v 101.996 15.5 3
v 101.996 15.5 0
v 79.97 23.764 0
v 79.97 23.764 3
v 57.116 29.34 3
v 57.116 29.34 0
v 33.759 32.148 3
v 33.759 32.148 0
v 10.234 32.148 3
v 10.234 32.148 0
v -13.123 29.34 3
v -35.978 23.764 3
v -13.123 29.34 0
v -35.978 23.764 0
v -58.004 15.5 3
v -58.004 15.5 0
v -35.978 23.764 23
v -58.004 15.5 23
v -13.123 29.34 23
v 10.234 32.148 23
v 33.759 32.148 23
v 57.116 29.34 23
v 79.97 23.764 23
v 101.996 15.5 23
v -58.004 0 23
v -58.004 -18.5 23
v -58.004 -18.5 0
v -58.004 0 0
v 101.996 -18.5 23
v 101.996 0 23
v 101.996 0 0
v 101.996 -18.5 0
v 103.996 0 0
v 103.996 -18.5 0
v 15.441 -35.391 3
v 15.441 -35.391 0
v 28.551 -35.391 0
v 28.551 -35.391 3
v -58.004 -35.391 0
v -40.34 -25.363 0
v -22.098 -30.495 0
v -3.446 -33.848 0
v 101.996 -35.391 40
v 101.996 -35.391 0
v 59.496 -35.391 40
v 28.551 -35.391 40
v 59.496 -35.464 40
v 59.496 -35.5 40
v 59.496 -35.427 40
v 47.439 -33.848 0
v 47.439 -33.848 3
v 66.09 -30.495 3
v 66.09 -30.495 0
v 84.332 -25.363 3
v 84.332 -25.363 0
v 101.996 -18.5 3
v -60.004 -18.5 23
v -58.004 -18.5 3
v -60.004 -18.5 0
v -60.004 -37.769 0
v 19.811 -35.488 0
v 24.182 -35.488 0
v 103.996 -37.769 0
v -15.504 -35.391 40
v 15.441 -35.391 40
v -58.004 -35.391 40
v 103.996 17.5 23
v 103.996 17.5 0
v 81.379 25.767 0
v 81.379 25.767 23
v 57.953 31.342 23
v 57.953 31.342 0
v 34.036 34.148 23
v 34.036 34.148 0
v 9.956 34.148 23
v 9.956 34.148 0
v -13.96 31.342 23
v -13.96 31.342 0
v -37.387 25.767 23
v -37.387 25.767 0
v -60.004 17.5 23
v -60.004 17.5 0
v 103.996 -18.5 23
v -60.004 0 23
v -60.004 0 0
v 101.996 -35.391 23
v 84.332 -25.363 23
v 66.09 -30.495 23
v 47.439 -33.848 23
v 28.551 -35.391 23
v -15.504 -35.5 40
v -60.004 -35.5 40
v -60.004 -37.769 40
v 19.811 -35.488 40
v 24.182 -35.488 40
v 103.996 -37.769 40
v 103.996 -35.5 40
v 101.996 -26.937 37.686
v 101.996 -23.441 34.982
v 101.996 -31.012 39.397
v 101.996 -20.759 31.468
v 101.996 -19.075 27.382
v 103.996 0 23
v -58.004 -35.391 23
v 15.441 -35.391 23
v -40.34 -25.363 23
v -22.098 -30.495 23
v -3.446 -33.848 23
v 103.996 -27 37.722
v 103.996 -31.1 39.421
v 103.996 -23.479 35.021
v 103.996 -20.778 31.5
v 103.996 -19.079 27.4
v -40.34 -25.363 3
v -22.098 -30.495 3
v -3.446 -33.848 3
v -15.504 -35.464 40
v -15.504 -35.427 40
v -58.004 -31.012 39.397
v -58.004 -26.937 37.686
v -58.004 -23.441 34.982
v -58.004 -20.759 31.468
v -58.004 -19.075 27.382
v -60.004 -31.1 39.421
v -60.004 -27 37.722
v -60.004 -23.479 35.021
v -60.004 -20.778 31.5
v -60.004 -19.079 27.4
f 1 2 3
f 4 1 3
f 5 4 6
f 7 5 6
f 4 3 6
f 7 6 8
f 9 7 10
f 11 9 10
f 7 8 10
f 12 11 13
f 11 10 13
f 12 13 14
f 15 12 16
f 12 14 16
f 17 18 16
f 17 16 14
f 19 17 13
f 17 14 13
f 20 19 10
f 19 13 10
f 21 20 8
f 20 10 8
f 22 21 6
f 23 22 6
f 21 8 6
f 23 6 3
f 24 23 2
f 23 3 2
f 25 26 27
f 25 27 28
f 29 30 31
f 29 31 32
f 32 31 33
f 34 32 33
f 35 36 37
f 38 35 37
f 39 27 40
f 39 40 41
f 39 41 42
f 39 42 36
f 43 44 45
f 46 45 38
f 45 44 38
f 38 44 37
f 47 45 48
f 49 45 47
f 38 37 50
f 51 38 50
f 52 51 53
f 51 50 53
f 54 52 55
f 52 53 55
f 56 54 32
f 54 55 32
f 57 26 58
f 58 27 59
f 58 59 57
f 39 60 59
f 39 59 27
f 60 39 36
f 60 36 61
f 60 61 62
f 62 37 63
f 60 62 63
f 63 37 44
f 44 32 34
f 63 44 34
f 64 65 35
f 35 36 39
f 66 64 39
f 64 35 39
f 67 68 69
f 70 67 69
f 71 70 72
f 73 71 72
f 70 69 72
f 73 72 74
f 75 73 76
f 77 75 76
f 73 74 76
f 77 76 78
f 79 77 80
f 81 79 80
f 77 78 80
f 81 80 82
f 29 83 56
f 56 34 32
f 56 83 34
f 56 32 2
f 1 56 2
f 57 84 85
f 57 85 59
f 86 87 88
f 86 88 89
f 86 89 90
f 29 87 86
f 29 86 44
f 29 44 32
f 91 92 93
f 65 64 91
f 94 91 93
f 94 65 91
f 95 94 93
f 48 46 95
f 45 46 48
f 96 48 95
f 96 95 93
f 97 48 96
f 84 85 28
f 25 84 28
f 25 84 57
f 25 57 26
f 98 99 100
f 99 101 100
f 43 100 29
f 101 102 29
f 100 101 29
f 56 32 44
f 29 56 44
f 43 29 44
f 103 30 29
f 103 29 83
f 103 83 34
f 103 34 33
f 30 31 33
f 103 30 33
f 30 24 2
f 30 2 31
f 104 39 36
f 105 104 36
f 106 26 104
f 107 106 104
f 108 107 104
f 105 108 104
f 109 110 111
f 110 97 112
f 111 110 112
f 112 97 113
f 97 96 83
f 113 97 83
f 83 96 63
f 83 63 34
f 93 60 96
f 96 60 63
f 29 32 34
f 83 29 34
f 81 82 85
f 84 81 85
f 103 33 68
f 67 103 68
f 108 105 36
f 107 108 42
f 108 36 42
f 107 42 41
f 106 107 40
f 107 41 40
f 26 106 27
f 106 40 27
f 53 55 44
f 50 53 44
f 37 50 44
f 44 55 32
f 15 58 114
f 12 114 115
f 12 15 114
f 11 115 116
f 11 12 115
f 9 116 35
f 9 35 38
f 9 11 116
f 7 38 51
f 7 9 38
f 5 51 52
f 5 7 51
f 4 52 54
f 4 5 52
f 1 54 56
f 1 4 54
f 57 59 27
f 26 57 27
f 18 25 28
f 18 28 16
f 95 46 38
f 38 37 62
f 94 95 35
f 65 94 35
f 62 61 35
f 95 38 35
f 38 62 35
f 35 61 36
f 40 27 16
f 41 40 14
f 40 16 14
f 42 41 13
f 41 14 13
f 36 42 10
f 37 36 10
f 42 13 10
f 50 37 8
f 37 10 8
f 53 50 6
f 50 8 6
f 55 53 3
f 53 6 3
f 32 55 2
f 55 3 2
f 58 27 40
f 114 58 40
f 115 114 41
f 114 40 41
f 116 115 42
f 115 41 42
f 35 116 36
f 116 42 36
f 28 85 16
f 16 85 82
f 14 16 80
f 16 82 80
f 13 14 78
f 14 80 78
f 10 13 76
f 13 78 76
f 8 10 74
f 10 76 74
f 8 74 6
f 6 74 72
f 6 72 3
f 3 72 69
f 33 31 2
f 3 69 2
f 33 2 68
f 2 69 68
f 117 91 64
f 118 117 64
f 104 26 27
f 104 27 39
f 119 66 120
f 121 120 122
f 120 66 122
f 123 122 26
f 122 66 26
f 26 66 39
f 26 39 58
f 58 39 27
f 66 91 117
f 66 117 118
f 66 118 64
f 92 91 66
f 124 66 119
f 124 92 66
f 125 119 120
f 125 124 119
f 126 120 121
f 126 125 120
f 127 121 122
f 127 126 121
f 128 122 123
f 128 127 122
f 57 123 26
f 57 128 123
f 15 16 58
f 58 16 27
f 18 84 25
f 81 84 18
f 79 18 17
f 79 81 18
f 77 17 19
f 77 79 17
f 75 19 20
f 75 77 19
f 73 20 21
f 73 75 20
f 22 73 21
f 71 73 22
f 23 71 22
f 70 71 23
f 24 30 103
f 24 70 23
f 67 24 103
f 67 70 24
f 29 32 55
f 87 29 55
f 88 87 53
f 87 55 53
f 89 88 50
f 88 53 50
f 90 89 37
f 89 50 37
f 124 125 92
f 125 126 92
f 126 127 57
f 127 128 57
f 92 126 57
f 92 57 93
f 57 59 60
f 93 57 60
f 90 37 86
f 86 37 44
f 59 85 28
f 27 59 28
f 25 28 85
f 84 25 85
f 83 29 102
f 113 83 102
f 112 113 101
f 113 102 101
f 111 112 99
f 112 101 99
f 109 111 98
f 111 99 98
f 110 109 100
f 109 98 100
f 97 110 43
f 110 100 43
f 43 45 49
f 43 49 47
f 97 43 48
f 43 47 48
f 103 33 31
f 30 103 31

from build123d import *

# Parameters (mm, degrees)
F1_DEPTH    = 3
F2_DEPTH    = 40
F3_DEPTH    = 23
F4_DEPTH    = 23
F5_T1_DEPTH = 87
F6_T1_DEPTH = 87
F7_DEPTH    = 23
F8_DEPTH    = 23


# Not quite as in the source:
# - a fillet or chamfer that OpenCascade refuses, or shapes differently, is made with other operations: its cross-section is extruded or revolved along the edge and cut away or added


with BuildPart() as f1:
    # F0 (on Top) → F1 (new body)
    with BuildSketch(Plane.XY):
        with BuildLine():
            Line((-58.0038166074, 15.5), (-58.0038166074, 0))
            Line((-58.0038166074, 0), (-58.0038166074, -3))
            Line((-58.0038166074, -3), (-58.0038166074, -18.5))
            ThreePointArc((-58.0038166074, -18.5), (-22.0977805804, -30.4949807288), (15.4409240709, -35.3907583952))
            Line((15.4409240709, -35.3907583952), (28.5514427142, -35.3907583952))
            ThreePointArc((28.5514427142, -35.3907583952), (66.0901473656, -30.4949807288), (101.9961833926, -18.5))
            Line((101.9961833926, -18.5), (101.9961833926, -15.5))
            Line((101.9961833926, -15.5), (101.9961833926, -3))
            Line((101.9961833926, -3), (101.9961833926, 0))
            Line((101.9961833926, 0), (101.9961833926, 15.5))
            ThreePointArc((101.9961833926, 15.5), (21.9961833926, 32.5), (-58.0038166074, 15.5))
        make_face()
    extrude(amount=F1_DEPTH)

    # F0 (on Top) → F2 (join)
    with BuildSketch(Plane.XY):
        with BuildLine():
            Line((-58.0038166074, -35.3907583952), (-58.0038166074, -18.5))
            Line((-58.0038166074, -18.5), (-60.0038166074, -18.5))
            Line((-60.0038166074, -18.5), (-60.0038166074, -20.5))
            Line((-60.0038166074, -20.5), (-60.0038166074, -37.7693227232))
            Line((-60.0038166074, -37.7693227232), (103.9961833926, -37.7693227232))
            Line((103.9961833926, -37.7693227232), (103.9961833926, -20.5))
            Line((103.9961833926, -20.5), (103.9961833926, -18.5))
            Line((103.9961833926, -18.5), (101.9961833926, -18.5))
            Line((101.9961833926, -18.5), (101.9961833926, -35.3907583952))
            Line((101.9961833926, -35.3907583952), (28.5514427142, -35.3907583952))
            ThreePointArc((28.5514427142, -35.3907583952), (21.9961833926, -35.5), (15.4409240709, -35.3907583952))
            Line((15.4409240709, -35.3907583952), (-58.0038166074, -35.3907583952))
        make_face()
    extrude(amount=F2_DEPTH)

    # F5: fillet of radius 17 on 1 edges, made by hand

    # F5_s2 → F5_t1 (cut)
    with BuildSketch(Plane.YZ.offset(-102.5038166074)):
        with BuildLine():
            ThreePointArc((-35.5, 40), (-23.4791847198, 35.0208152802), (-18.5, 23))
            Line((-18.5, 23), (-18.5, 40))
            Line((-18.5, 40), (-35.5, 40))
        make_face()
    extrude(amount=F5_T1_DEPTH, mode=Mode.SUBTRACT)

    # F6: fillet of radius 17 on 1 edges, made by hand

    # F6_s2 → F6_t1 (cut)
    with BuildSketch(Plane.YZ.offset(59.4961833926)):
        with BuildLine():
            ThreePointArc((-18.5, 23), (-23.4791847198, 35.0208152802), (-35.5, 40))
            Line((-35.5, 40), (-18.5, 40))
            Line((-18.5, 40), (-18.5, 23))
        make_face()
    extrude(amount=F6_T1_DEPTH, mode=Mode.SUBTRACT)


with BuildPart() as f3:
    # F0 (on Top) → F3 (new body)
    with BuildSketch(Plane.XY):
        with BuildLine():
            Line((-60.0038166074, 0), (-58.0038166074, 0))
            Line((-58.0038166074, 0), (-58.0038166074, 15.5))
            ThreePointArc((-58.0038166074, 15.5), (21.9961833926, 32.5), (101.9961833926, 15.5))
            Line((101.9961833926, 15.5), (101.9961833926, 0))
            Line((101.9961833926, 0), (103.9961833926, 0))
            Line((103.9961833926, 0), (103.9961833926, 17.5))
            ThreePointArc((103.9961833926, 17.5), (21.9961833926, 34.5), (-60.0038166074, 17.5))
            Line((-60.0038166074, 17.5), (-60.0038166074, 0))
        make_face()
    extrude(amount=F3_DEPTH)


with BuildPart() as f4:
    # F0 (on Top) → F4 (new body)
    with BuildSketch(Plane.XY):
        with BuildLine():
            ThreePointArc((101.9961833926, -18.5), (66.0901473656, -30.4949807288), (28.5514427142, -35.3907583952))
            Line((28.5514427142, -35.3907583952), (101.9961833926, -35.3907583952))
            Line((101.9961833926, -35.3907583952), (101.9961833926, -18.5))
        make_face()
    extrude(amount=F4_DEPTH)


with BuildPart() as f4b:
    # F0 (on Top) → F4, piece 2 (new body)
    with BuildSketch(Plane.XY):
        with BuildLine():
            ThreePointArc((15.4409240709, -35.3907583952), (-22.0977805804, -30.4949807288), (-58.0038166074, -18.5))
            Line((-58.0038166074, -18.5), (-58.0038166074, -35.3907583952))
            Line((-58.0038166074, -35.3907583952), (15.4409240709, -35.3907583952))
        make_face()
    extrude(amount=F4_DEPTH)


with BuildPart() as f7:
    # F0 (on Top) → F7 (new body)
    with BuildSketch(Plane.XY):
        Polygon((-58.0038166074, -3), (-58.0038166074, 0), (-60.0038166074, 0), (-60.0038166074, -3), (-60.0038166074, -18.5), (-58.0038166074, -18.5), align=None)
    extrude(amount=F7_DEPTH)


with BuildPart() as f8:
    # F0 (on Top) → F8 (new body)
    with BuildSketch(Plane.XY):
        Polygon((103.9961833926, 0), (101.9961833926, 0), (101.9961833926, -3), (101.9961833926, -15.5), (101.9961833926, -18.5), (103.9961833926, -18.5), (103.9961833926, -17.5), (103.9961833926, -3), align=None)
    extrude(amount=F8_DEPTH)


solid = Compound([f1.part, f3.part, f4.part, f4b.part, f7.part, f8.part])
